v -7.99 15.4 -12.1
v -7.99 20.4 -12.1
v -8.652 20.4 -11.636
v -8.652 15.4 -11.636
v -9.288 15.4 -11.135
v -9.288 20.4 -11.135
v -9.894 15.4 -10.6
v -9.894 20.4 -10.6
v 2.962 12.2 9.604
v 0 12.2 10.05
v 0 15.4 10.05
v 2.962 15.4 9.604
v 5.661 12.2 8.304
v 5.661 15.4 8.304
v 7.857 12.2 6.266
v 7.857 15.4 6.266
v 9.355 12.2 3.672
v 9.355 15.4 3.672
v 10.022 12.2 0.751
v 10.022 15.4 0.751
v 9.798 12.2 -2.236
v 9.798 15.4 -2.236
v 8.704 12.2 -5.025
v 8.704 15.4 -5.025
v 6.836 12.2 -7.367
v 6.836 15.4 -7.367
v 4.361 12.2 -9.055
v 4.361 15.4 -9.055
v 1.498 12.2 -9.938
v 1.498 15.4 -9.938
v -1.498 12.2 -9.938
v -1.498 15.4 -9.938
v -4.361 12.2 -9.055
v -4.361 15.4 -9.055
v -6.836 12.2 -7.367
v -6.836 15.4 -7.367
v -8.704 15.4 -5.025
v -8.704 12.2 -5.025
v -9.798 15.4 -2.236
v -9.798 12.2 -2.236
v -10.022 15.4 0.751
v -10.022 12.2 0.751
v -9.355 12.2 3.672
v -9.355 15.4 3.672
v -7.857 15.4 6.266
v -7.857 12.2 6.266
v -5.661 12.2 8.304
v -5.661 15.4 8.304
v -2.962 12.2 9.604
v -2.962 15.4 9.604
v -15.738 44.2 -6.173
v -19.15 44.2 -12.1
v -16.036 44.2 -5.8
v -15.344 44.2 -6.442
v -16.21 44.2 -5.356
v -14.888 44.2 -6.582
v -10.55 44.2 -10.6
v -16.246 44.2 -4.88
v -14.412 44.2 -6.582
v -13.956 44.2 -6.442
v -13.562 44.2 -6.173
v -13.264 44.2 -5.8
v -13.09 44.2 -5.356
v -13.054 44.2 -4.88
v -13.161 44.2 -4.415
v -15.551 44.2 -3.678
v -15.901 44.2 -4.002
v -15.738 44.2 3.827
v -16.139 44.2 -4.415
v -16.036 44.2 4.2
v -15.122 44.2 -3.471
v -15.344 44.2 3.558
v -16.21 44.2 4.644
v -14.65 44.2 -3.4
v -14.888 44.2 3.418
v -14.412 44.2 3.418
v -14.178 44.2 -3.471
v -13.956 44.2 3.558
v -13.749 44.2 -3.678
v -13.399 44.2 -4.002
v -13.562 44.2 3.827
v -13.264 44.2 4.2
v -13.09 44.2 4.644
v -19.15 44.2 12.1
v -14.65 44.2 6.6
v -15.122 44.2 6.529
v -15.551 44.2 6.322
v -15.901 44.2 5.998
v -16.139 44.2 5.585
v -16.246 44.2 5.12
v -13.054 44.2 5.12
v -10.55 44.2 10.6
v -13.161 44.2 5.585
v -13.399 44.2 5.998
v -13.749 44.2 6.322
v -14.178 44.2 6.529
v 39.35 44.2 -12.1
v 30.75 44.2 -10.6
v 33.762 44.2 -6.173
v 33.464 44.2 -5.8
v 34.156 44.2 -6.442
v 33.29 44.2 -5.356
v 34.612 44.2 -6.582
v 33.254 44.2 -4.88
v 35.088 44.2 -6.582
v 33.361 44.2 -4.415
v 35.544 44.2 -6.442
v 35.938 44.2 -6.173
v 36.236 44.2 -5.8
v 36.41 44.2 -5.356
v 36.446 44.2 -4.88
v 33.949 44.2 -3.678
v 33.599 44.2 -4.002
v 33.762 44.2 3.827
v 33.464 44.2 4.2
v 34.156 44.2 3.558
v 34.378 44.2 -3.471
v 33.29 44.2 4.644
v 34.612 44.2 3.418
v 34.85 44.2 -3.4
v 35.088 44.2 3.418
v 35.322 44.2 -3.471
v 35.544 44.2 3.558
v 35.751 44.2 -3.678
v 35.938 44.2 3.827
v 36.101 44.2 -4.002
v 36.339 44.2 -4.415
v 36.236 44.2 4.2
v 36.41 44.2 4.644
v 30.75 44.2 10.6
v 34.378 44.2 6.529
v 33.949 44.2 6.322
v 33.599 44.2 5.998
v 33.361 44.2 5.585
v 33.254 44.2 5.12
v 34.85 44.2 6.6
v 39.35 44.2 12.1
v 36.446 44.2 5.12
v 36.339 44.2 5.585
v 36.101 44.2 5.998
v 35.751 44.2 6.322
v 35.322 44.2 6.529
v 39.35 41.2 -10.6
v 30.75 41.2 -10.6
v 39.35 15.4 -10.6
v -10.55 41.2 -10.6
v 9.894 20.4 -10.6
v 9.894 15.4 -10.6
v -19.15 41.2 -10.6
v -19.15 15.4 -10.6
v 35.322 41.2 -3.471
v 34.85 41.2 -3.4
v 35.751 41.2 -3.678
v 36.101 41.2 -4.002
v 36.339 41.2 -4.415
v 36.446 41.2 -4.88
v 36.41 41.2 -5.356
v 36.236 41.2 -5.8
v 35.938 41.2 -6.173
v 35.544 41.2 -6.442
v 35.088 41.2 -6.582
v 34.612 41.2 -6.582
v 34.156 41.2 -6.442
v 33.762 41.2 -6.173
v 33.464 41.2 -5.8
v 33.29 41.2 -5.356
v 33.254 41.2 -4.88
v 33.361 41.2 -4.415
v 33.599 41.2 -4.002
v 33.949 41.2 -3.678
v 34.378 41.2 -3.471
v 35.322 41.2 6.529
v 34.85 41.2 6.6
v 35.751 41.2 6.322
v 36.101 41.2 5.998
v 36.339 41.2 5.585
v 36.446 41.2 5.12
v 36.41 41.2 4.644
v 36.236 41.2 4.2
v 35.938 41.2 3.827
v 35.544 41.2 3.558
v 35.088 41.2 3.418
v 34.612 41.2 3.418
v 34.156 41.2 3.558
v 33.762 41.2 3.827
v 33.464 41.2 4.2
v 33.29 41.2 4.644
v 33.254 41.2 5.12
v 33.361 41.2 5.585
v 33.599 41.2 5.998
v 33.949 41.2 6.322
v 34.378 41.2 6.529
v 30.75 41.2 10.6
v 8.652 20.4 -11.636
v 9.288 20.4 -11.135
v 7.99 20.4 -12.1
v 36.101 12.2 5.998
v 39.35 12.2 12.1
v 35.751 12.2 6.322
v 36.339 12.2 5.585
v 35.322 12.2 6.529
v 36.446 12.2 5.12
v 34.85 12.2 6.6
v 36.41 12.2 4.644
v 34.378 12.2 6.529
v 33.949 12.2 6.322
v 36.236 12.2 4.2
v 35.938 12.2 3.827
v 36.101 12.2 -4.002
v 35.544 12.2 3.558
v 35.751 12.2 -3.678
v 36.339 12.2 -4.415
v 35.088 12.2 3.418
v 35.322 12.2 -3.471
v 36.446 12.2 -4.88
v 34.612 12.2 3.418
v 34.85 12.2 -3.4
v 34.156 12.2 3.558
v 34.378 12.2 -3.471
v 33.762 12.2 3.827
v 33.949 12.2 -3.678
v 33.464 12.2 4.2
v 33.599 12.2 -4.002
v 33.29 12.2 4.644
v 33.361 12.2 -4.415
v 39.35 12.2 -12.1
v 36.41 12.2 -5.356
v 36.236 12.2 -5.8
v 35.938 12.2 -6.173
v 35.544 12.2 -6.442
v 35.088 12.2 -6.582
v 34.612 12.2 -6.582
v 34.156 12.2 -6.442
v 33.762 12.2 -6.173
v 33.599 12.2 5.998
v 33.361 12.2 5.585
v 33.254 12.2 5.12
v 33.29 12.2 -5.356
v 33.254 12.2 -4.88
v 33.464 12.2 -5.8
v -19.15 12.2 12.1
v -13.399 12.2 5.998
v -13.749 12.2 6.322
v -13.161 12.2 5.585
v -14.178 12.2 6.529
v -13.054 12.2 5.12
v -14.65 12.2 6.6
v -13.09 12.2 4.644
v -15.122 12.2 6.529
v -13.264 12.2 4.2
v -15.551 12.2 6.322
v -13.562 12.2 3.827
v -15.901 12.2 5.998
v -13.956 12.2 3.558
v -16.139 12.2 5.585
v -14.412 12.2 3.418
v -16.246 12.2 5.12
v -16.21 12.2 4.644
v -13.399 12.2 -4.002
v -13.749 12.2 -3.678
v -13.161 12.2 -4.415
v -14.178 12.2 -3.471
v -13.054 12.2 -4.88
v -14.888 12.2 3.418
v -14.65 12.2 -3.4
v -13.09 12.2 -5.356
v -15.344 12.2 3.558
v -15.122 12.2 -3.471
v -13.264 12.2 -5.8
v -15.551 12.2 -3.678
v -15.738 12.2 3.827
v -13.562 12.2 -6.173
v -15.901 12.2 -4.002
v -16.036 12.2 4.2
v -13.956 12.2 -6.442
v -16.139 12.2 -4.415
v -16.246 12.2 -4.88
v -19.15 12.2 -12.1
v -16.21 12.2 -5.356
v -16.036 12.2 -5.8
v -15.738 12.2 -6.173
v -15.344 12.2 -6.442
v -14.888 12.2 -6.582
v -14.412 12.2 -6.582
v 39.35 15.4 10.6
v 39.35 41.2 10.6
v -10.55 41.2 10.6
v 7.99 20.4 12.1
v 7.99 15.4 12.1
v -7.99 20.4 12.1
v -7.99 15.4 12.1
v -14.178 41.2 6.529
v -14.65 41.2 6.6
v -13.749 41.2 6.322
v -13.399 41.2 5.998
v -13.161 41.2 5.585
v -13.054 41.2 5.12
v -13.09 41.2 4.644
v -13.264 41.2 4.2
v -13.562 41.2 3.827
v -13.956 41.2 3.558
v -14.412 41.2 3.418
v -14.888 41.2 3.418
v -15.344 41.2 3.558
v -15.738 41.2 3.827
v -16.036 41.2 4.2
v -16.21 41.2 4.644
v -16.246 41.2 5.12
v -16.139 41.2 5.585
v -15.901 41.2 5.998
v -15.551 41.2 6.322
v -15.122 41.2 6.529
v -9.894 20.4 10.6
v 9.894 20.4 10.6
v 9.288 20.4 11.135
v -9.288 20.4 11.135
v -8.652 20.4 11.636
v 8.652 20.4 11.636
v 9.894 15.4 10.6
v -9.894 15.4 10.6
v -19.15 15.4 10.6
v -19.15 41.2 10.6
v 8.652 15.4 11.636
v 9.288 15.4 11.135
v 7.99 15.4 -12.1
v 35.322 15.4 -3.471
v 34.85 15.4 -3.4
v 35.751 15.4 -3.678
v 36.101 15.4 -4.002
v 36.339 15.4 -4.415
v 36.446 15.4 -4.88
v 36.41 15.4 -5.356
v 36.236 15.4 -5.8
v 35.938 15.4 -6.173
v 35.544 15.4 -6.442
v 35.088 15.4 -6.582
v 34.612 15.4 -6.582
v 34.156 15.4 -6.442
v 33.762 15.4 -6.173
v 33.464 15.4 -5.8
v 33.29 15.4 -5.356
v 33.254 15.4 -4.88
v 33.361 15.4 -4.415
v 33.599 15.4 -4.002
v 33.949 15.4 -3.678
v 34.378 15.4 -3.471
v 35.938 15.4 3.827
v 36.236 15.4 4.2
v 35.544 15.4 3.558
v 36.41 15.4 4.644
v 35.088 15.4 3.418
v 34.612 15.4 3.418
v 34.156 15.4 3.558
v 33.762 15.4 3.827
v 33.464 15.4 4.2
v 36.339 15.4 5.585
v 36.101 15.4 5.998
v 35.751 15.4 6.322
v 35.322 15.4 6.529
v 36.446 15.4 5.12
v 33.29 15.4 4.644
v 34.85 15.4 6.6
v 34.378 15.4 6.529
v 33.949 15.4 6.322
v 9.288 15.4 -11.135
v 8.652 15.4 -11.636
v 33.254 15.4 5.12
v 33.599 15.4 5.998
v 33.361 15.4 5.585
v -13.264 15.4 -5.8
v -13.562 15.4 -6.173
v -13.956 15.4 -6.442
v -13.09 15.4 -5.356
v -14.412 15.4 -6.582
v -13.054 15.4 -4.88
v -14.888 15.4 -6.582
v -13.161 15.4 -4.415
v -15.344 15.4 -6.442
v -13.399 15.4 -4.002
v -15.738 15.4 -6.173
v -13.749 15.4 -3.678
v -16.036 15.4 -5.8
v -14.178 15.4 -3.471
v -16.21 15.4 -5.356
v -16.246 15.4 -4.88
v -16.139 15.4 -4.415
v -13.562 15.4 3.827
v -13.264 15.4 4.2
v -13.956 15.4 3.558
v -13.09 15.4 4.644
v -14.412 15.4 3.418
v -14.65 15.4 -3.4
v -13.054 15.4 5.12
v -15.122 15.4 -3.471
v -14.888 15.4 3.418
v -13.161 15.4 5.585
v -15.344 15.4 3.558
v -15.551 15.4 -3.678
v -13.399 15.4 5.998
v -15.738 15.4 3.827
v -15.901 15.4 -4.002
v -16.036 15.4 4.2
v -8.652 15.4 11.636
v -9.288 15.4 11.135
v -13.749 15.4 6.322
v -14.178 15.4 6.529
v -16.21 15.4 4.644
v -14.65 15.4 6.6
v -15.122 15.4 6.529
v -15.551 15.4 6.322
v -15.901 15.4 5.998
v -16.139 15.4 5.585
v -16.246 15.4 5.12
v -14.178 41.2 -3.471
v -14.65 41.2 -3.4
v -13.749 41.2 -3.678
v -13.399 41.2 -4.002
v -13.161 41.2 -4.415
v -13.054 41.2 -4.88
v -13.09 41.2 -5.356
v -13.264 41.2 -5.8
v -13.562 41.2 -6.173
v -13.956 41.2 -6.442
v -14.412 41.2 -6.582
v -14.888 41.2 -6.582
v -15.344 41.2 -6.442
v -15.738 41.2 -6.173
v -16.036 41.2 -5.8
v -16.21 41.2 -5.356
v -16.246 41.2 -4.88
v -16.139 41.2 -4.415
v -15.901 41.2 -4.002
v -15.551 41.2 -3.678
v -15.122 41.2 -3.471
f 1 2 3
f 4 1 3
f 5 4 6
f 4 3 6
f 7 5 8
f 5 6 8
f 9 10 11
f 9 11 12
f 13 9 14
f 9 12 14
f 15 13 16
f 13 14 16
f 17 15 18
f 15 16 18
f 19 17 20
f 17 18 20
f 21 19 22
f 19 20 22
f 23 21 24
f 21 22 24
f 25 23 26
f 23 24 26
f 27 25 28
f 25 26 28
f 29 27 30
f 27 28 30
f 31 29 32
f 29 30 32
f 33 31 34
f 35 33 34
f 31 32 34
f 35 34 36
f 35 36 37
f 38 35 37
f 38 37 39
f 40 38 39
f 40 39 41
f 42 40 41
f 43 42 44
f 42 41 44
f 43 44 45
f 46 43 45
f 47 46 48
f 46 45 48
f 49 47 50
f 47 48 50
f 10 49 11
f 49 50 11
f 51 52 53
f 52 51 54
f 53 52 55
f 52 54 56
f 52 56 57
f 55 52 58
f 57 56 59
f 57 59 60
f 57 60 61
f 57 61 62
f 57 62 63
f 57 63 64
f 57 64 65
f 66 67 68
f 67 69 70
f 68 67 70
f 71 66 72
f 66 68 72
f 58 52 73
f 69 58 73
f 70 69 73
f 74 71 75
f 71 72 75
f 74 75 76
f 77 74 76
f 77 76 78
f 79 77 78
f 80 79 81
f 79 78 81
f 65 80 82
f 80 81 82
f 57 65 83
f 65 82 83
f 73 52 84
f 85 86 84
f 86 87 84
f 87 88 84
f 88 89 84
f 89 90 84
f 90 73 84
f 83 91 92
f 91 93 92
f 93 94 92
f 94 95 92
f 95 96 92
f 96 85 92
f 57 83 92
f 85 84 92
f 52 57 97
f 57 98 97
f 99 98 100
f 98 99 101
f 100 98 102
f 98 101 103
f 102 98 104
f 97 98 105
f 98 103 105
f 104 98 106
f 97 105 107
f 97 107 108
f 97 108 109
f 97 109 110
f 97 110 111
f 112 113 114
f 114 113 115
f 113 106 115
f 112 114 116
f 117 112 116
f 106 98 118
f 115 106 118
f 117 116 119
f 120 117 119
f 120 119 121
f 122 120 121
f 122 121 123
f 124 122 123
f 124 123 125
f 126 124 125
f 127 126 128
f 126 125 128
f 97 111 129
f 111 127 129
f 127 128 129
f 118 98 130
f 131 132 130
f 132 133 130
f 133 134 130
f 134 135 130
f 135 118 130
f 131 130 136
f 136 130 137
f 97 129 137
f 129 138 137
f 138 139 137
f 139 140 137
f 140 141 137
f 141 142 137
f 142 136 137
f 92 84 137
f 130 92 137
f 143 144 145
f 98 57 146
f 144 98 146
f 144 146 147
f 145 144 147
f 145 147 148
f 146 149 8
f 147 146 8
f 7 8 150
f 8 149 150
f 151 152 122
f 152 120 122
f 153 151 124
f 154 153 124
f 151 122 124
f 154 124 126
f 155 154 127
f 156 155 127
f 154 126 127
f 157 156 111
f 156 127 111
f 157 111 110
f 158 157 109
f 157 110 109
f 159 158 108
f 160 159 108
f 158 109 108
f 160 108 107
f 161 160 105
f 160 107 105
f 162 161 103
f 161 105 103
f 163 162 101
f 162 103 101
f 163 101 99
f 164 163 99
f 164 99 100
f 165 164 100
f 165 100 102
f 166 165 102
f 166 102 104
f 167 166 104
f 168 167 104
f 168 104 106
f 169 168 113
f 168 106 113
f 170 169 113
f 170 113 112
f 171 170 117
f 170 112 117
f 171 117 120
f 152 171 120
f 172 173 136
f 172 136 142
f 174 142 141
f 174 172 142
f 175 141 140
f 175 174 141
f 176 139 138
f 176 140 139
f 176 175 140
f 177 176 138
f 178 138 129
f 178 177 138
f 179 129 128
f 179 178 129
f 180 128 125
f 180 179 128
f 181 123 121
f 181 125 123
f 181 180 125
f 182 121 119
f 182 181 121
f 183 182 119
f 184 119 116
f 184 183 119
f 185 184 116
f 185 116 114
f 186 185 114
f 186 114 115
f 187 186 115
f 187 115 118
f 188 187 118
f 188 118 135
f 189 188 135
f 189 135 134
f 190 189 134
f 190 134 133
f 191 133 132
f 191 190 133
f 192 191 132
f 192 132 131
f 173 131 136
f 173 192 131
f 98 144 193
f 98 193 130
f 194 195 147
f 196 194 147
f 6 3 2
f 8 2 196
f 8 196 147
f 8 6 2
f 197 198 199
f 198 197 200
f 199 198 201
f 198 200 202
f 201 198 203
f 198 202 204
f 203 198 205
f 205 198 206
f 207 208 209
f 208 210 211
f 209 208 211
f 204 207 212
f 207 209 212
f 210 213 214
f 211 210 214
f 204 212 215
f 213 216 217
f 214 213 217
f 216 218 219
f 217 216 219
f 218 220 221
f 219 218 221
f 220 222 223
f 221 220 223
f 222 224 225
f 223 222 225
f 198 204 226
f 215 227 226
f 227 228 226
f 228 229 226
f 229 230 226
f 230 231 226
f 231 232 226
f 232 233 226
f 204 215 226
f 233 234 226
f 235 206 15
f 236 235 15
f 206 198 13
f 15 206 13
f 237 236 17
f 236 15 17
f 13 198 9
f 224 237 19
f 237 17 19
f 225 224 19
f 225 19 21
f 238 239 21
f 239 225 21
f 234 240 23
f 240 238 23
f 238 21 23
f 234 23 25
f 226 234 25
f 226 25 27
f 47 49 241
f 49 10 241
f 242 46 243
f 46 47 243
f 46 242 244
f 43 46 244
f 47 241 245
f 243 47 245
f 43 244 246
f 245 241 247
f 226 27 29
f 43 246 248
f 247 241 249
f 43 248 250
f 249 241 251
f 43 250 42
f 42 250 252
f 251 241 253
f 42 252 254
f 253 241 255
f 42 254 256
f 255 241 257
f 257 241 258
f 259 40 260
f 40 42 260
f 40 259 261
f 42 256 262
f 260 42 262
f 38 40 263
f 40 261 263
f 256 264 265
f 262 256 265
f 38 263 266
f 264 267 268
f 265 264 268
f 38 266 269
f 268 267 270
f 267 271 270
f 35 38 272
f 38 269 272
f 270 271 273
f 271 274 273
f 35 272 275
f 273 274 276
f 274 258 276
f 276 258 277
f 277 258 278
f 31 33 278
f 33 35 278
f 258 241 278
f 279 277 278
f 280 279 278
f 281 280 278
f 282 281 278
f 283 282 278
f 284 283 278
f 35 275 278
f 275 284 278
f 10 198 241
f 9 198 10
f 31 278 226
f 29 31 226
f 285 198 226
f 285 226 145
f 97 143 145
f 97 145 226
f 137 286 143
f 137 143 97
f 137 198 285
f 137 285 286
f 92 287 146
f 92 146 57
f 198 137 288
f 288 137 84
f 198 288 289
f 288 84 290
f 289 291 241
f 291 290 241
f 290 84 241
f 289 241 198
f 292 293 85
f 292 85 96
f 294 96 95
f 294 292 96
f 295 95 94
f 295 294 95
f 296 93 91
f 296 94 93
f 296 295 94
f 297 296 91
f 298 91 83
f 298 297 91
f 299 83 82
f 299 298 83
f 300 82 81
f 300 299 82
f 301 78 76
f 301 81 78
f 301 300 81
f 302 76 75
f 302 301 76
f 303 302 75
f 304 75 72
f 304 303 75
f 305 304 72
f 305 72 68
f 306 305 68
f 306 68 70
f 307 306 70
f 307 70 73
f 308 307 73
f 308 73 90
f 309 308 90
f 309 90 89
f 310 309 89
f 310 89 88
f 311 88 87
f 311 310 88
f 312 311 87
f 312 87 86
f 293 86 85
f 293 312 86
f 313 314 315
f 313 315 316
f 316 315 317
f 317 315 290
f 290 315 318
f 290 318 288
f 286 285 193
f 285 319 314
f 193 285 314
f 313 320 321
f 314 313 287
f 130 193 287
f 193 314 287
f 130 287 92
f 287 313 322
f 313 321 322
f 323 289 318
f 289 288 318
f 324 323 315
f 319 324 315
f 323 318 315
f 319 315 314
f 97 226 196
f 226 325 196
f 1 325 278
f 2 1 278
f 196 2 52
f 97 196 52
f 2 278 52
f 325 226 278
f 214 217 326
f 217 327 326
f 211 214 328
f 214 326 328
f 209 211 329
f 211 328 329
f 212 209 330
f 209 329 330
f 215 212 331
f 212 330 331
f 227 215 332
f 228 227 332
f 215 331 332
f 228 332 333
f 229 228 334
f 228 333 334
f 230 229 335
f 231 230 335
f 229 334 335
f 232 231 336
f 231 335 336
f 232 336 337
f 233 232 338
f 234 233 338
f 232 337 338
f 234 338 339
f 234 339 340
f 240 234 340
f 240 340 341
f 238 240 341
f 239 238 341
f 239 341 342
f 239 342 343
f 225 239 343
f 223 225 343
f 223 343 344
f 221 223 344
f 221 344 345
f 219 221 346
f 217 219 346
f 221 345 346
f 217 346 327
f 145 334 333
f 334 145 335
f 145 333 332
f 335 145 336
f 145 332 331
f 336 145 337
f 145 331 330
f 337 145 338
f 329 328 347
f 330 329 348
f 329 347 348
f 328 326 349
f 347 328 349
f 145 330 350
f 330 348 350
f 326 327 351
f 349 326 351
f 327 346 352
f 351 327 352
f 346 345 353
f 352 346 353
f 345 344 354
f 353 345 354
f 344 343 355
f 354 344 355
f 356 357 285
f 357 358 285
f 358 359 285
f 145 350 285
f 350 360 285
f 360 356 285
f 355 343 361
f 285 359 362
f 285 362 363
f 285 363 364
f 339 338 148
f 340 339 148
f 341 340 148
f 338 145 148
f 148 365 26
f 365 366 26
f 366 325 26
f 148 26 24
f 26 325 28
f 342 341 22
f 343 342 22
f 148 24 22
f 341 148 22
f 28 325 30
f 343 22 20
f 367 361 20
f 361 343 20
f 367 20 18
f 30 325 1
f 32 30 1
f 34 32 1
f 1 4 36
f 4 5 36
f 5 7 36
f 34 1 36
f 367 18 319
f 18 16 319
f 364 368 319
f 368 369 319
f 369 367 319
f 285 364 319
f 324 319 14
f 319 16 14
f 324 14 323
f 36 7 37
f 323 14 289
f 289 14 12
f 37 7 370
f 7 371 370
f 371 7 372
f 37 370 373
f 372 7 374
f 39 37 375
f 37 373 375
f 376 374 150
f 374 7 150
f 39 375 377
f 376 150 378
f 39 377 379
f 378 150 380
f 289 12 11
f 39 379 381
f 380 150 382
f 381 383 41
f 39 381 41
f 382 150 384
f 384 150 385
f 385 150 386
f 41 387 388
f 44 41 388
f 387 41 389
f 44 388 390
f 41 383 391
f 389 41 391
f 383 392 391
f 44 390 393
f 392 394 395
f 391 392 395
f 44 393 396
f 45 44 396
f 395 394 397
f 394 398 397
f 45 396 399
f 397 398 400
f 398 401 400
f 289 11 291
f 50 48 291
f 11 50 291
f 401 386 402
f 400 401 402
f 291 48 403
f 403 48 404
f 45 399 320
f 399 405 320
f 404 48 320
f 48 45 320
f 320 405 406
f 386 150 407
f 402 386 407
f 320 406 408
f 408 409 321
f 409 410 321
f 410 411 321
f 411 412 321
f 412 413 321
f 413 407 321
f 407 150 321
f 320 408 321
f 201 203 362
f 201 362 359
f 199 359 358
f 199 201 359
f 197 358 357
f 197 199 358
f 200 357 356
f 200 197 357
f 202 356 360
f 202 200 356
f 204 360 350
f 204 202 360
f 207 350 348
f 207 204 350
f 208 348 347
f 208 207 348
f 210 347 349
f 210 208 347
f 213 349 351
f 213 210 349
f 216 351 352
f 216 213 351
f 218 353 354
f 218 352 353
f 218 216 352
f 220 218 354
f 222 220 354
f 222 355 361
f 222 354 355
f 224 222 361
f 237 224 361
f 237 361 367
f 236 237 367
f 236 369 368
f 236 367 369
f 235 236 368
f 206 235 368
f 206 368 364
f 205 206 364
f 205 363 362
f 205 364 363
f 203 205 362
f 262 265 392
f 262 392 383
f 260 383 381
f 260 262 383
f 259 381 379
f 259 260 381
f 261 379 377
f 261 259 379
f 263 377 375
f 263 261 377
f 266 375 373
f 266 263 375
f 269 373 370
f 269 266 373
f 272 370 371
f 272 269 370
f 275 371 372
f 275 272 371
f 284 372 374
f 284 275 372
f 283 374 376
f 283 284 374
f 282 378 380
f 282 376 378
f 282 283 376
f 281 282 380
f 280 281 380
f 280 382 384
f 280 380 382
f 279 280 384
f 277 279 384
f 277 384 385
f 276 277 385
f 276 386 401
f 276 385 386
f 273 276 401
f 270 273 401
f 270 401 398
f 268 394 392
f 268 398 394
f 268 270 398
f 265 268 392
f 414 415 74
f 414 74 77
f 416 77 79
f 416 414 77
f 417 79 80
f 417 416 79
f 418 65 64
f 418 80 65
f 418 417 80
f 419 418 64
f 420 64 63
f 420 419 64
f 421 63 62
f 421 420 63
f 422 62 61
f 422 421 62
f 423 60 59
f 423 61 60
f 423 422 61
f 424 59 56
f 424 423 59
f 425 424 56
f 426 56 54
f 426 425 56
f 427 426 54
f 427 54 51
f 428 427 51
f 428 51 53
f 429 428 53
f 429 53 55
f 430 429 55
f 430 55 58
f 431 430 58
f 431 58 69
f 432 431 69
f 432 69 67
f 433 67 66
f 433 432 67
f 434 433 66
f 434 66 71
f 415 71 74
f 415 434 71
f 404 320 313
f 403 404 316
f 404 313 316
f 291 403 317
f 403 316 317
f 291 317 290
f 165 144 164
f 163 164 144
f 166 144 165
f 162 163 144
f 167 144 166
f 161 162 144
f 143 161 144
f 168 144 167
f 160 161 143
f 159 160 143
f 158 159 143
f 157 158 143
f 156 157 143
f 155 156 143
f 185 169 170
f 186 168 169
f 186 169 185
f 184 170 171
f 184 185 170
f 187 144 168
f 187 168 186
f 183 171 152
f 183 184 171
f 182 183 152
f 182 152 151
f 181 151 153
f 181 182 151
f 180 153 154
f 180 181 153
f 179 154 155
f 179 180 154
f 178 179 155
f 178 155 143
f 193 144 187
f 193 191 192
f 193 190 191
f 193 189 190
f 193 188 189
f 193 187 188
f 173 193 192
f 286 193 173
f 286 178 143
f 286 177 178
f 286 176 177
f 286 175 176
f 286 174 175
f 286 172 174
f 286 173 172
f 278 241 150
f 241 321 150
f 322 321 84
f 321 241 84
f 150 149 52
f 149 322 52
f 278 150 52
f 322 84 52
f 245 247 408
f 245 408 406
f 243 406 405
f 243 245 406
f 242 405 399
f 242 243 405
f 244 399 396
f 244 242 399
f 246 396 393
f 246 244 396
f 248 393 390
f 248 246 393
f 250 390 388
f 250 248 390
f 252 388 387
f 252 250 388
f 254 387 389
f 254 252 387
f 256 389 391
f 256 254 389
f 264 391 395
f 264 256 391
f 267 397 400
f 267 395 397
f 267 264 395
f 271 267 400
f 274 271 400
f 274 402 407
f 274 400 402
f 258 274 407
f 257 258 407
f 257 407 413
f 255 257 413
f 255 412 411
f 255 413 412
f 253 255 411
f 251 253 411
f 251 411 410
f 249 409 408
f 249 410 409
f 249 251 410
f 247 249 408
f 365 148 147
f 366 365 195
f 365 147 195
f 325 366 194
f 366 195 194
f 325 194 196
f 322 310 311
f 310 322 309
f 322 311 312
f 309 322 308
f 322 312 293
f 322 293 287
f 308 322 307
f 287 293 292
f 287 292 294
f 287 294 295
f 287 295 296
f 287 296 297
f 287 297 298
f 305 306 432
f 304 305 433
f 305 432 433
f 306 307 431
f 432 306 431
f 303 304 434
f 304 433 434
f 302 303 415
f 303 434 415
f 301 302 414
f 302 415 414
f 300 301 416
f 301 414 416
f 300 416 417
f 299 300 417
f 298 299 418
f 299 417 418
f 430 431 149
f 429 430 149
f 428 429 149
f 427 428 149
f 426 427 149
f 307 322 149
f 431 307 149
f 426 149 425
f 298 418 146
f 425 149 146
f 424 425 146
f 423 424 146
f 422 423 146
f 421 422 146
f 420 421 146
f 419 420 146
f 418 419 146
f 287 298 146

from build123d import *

# Parameters (mm, degrees)
CHANNEL_DEPTH             = 39.35
CHANNEL_DEPTH_BACK        = 19.15
FLANGES_SKETCH_W          = 8.6
FLANGES_SKETCH_H          = 3
FLANGES_DEPTH             = 10.6
SERVO_HOLES_SKETCH_R      = 1.6
SERVO_HOLES_DEPTH         = 54.2
PANEL_HOLE_SKETCH_R       = 10.05
PANEL_HOLE_DEPTH          = 16.4
PANEL_NUT_RELIEF_SKETCH_W = 14.5
PANEL_NUT_RELIEF_SKETCH_H = 5


with BuildPart() as part:
    # Channel Sketch → Channel (new, two sides: drawn at the far end of the back side and taken through both)
    with BuildSketch(Plane(origin=(0, 0, 0), x_dir=(0, 0, -1), z_dir=(1, 0, 0)).offset(-CHANNEL_DEPTH_BACK)):
        Polygon((-12.1, 12.2), (12.1, 12.2), (12.1, 44.2), (10.6, 44.2), (10.6, 15.4), (-10.6, 15.4), (-10.6, 44.2), (-12.1, 44.2), align=None)
    extrude(amount=CHANNEL_DEPTH + CHANNEL_DEPTH_BACK)

    # Flanges Sketch → Flanges (add, symmetric)
    with BuildSketch(Plane.XY):
        with Locations((-14.85, 42.7)):
            Rectangle(FLANGES_SKETCH_W, FLANGES_SKETCH_H)
        with Locations((35.05, 42.7)):
            Rectangle(FLANGES_SKETCH_W, FLANGES_SKETCH_H)
    extrude(amount=FLANGES_DEPTH, both=True)

    # Servo Holes Sketch → Servo Holes (cut, symmetric)
    with BuildSketch(Plane(origin=(0, 0, 0), x_dir=(1, 0, 0), z_dir=(0, 1, 0))):
        with Locations((-14.65, -5)):
            Circle(SERVO_HOLES_SKETCH_R)
        with Locations((-14.65, 5)):
            Circle(SERVO_HOLES_SKETCH_R)
        with Locations((34.85, -5)):
            Circle(SERVO_HOLES_SKETCH_R)
        with Locations((34.85, 5)):
            Circle(SERVO_HOLES_SKETCH_R)
    extrude(amount=SERVO_HOLES_DEPTH, both=True, mode=Mode.SUBTRACT)

    # Panel Hole Sketch → Panel Hole (cut, symmetric)
    with BuildSketch(Plane(origin=(0, 0, 0), x_dir=(1, 0, 0), z_dir=(0, 1, 0))):
        Circle(PANEL_HOLE_SKETCH_R)
    extrude(amount=PANEL_HOLE_DEPTH, both=True, mode=Mode.SUBTRACT)

    # Panel Nut Relief Sketch → Panel Nut Relief (revolve, cut)
    with BuildSketch(Plane.XY):
        with Locations((7.25, 17.9)):
            Rectangle(PANEL_NUT_RELIEF_SKETCH_W, PANEL_NUT_RELIEF_SKETCH_H)
    revolve(axis=Axis((0, -500, 0), (0, 1, 0)), mode=Mode.SUBTRACT)


solid = part.part
